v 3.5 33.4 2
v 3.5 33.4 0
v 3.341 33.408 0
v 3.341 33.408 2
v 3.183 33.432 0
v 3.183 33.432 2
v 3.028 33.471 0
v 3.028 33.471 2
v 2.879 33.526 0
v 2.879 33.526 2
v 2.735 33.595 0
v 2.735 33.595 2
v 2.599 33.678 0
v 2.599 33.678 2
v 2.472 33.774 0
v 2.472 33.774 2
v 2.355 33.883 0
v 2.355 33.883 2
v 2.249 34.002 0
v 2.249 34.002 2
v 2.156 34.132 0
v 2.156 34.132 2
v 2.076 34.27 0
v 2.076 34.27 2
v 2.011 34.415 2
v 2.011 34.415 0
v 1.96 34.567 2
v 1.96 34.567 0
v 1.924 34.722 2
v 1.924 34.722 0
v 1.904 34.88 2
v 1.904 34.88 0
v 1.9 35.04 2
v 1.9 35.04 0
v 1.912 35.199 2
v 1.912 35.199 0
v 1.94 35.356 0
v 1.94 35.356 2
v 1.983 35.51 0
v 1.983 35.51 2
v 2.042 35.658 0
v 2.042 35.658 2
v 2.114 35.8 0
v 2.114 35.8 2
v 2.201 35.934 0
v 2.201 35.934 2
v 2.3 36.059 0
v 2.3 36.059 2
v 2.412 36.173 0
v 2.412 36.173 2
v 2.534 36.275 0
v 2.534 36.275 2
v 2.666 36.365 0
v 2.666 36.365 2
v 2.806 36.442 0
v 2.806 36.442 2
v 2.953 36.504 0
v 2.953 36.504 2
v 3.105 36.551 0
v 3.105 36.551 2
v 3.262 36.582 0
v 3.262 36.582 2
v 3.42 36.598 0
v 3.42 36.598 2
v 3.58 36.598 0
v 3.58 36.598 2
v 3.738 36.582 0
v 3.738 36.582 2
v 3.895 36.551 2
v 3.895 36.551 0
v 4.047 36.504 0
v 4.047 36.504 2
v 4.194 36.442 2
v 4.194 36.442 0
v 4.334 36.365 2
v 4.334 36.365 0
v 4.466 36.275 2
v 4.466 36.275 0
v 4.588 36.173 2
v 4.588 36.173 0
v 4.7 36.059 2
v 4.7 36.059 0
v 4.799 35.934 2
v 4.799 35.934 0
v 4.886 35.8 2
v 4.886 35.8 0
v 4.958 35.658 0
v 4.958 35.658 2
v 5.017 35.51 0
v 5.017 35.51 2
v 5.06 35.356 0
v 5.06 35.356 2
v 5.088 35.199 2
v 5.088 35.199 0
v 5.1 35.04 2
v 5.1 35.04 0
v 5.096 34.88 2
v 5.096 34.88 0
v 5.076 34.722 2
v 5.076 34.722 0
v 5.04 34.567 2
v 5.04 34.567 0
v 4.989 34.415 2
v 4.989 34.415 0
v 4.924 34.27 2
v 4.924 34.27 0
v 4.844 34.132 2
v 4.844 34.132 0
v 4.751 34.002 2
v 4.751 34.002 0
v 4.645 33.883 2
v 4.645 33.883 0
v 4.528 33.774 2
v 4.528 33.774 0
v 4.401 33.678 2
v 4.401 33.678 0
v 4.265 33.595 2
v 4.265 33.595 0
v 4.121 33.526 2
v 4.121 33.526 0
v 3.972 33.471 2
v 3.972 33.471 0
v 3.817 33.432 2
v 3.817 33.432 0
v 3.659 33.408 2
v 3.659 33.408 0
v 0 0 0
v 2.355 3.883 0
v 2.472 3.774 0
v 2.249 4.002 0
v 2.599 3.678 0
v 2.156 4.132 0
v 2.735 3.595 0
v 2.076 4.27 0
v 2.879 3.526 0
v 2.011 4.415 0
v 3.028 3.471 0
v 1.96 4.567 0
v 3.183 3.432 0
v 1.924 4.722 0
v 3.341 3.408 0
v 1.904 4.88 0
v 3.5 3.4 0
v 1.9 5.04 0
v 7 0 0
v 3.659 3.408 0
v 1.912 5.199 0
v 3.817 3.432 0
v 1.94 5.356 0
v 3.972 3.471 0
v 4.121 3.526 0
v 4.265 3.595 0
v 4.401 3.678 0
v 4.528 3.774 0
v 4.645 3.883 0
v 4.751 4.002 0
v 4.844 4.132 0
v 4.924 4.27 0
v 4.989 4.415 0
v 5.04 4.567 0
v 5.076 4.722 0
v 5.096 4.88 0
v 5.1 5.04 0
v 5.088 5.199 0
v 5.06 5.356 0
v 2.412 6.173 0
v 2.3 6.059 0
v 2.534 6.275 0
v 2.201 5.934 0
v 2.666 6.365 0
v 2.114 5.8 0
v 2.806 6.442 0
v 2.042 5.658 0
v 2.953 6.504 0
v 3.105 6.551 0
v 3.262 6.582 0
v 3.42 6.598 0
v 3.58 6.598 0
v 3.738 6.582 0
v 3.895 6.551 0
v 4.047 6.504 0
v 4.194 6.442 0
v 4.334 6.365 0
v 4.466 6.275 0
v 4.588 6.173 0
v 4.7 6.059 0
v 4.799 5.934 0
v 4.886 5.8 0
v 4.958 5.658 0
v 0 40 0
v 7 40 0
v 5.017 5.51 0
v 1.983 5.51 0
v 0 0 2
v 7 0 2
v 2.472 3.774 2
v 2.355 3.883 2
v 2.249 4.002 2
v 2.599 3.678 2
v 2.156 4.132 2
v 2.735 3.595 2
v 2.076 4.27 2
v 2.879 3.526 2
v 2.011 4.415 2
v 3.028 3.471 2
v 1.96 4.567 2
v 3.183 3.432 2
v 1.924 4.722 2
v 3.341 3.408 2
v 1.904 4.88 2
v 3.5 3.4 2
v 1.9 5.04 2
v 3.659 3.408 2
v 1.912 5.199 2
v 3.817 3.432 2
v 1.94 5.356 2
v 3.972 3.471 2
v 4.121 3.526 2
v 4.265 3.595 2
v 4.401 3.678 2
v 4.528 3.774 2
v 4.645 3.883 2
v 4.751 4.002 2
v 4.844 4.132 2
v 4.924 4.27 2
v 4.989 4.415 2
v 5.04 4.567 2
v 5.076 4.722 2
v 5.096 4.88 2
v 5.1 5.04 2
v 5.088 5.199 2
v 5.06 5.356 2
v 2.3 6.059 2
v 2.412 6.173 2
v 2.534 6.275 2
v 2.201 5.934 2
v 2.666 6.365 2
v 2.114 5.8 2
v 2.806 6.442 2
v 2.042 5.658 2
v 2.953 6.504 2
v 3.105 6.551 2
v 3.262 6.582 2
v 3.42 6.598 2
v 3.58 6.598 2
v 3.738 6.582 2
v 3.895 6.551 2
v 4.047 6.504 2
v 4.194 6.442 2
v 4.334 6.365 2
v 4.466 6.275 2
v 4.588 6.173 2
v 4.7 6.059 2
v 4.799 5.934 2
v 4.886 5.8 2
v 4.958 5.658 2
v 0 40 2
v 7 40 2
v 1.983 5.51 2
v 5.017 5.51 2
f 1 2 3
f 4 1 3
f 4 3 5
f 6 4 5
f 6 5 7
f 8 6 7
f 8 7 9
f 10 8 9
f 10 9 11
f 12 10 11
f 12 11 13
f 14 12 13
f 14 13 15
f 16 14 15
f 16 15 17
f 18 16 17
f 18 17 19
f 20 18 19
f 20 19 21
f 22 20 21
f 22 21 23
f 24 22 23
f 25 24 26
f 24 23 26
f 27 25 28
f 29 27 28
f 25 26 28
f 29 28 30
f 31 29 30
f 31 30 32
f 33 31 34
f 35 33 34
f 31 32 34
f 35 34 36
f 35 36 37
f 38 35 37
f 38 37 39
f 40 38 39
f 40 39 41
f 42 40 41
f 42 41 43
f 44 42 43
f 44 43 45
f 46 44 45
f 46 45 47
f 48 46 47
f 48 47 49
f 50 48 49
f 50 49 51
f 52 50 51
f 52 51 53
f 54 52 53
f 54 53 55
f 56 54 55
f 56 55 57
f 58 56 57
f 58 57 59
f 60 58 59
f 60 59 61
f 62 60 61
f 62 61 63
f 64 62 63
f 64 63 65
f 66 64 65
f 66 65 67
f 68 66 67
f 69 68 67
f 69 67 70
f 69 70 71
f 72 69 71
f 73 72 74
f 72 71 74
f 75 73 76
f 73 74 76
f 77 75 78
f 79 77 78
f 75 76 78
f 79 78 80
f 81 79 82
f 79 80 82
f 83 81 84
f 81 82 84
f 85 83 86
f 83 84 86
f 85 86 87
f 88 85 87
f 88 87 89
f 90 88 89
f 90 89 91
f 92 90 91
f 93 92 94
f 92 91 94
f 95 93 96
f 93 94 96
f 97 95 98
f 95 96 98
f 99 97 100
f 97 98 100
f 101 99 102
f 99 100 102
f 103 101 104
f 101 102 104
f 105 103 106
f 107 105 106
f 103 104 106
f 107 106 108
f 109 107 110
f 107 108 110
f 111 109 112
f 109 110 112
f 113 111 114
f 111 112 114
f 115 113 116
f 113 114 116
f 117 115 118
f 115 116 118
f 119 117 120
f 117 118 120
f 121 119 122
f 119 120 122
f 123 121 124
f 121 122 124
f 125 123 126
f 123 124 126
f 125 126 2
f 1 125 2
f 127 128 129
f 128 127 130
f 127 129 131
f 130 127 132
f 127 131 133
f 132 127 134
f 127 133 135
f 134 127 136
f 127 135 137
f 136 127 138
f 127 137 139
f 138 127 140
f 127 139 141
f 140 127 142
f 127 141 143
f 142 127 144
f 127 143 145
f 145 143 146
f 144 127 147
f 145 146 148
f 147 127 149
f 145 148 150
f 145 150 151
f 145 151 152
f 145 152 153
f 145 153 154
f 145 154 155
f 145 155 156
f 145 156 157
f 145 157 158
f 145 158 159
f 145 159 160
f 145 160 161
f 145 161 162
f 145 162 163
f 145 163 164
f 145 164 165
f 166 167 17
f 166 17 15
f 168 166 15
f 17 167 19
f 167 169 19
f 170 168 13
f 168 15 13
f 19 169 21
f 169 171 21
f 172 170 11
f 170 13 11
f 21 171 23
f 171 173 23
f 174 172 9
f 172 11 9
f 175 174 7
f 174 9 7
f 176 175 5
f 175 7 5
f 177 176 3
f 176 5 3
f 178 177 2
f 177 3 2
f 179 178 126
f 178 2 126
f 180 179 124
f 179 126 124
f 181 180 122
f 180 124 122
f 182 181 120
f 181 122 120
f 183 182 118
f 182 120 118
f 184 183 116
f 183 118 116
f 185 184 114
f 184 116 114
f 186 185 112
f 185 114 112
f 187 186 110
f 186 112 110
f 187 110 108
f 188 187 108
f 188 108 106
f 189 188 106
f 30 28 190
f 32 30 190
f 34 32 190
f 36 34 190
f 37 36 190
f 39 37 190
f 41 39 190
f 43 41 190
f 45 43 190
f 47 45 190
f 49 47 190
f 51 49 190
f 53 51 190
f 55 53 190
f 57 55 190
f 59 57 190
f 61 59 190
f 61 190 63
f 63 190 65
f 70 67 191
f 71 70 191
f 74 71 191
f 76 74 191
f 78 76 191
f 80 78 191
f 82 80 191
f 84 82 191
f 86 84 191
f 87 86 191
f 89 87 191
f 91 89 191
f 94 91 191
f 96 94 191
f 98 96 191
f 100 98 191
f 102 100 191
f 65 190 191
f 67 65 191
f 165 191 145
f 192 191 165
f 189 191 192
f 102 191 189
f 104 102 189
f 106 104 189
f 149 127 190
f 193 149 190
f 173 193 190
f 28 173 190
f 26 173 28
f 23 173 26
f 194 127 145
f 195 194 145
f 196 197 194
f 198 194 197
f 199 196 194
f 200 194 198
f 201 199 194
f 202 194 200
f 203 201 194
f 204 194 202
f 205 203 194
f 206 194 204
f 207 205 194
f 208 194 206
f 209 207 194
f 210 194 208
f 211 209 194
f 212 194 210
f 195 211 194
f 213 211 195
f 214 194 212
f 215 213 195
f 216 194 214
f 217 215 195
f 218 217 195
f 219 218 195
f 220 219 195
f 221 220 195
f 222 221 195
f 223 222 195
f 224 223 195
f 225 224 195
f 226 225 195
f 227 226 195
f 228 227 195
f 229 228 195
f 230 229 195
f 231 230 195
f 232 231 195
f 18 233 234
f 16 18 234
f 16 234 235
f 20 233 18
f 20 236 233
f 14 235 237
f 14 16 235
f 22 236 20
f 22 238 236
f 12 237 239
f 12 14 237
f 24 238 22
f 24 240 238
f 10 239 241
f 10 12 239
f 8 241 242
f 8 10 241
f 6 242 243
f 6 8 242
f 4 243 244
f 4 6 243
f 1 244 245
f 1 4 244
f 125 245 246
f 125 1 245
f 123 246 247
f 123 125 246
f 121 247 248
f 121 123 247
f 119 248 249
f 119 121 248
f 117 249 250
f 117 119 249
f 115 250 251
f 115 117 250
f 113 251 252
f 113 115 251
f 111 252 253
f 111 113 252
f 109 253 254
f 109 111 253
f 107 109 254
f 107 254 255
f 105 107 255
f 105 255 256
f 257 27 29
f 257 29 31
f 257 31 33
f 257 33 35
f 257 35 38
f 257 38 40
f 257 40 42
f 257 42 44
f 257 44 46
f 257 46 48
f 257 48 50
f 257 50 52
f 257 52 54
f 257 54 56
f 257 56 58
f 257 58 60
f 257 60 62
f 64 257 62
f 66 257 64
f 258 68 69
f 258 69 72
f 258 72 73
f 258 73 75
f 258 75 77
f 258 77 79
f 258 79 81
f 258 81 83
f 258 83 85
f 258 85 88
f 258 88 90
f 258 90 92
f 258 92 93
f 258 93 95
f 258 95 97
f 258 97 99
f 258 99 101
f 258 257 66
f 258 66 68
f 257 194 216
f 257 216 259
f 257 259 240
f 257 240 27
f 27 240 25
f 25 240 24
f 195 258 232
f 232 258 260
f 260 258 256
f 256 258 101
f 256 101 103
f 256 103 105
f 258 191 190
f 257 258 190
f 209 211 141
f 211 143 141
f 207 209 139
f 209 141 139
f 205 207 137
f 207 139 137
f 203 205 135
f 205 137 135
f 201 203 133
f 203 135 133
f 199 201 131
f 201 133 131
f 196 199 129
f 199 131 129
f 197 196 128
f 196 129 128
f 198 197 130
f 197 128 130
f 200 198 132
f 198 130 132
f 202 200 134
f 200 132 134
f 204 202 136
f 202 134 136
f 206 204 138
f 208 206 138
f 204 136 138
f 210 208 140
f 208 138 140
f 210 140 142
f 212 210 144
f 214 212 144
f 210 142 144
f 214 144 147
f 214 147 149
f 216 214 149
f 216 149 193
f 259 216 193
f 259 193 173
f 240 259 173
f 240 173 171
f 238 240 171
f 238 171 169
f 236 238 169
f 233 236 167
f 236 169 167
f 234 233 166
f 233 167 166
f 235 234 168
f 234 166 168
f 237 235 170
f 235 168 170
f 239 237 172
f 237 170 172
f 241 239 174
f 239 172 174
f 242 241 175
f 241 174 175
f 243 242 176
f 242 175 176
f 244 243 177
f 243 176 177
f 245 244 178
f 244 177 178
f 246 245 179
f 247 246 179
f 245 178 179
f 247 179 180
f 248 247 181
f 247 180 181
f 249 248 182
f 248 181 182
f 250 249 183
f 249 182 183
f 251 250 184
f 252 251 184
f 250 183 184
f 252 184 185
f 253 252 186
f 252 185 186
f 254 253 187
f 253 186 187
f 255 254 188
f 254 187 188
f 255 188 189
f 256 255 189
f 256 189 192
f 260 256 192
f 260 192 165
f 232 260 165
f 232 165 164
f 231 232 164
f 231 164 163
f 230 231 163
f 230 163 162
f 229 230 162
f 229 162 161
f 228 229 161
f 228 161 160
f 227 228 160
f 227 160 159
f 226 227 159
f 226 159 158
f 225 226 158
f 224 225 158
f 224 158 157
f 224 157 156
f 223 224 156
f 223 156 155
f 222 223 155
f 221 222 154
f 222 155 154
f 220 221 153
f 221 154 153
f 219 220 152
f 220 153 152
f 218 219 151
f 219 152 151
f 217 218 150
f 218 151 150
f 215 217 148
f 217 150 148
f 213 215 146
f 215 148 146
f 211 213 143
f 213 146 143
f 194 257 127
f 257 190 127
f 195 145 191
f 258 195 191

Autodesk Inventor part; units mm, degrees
ref_plane "YZ Plane" through (0, 0, 0) normal (1, 0, 0) x (0, 1, 0)
ref_plane "XZ Plane" through (0, 0, 0) normal (0, 1, 0) x (-1, 0, 0)
ref_plane "XY Plane" through (0, 0, 0) normal (0, 0, 1) x (1, 0, 0)
sketch "スケッチ1" plane through (0, 0, 0) normal (0, 0, 1) x (1, 0, 0)
  line L0 (0, 0) -> (7, 0)
  line L1 (7, 0) -> (7, 40)
  line L2 (7, 40) -> (0, 40)
  line L3 (0, 40) -> (0, 0)
  dimension "d0" = 7
  dimension "d1" = 40
extrude "押し出し1" add sketch "スケッチ1" along normal blind 2
sketch "スケッチ2" plane through (0, 0, 2) normal (0, 0, 1) x (1, 0, 0)
  line L0 (7, 0) -> (7, 40) projected
  line L1 (7, 40) -> (0, 40) projected
  line L2 (0, 0) -> (7, 0) projected
  point P0 (3.5, 35)
  point P1 (3.5, 5)
  dimension "d4" = 3.5
  dimension "d5" = 5
  dimension "d6" = 3.5
  dimension "d7" = 5
hole "穴1" at (3.5, 35, 2) at (3.5, 5, 2) direction (0, 0, -1) diameter 3.2 end through all
sketch "スケッチ3" plane through (0, 0, 2) normal (0, 0, 1) x (1, 0, 0)
  point P0 (0, 0)
properties part number "リンク40×7×2"
